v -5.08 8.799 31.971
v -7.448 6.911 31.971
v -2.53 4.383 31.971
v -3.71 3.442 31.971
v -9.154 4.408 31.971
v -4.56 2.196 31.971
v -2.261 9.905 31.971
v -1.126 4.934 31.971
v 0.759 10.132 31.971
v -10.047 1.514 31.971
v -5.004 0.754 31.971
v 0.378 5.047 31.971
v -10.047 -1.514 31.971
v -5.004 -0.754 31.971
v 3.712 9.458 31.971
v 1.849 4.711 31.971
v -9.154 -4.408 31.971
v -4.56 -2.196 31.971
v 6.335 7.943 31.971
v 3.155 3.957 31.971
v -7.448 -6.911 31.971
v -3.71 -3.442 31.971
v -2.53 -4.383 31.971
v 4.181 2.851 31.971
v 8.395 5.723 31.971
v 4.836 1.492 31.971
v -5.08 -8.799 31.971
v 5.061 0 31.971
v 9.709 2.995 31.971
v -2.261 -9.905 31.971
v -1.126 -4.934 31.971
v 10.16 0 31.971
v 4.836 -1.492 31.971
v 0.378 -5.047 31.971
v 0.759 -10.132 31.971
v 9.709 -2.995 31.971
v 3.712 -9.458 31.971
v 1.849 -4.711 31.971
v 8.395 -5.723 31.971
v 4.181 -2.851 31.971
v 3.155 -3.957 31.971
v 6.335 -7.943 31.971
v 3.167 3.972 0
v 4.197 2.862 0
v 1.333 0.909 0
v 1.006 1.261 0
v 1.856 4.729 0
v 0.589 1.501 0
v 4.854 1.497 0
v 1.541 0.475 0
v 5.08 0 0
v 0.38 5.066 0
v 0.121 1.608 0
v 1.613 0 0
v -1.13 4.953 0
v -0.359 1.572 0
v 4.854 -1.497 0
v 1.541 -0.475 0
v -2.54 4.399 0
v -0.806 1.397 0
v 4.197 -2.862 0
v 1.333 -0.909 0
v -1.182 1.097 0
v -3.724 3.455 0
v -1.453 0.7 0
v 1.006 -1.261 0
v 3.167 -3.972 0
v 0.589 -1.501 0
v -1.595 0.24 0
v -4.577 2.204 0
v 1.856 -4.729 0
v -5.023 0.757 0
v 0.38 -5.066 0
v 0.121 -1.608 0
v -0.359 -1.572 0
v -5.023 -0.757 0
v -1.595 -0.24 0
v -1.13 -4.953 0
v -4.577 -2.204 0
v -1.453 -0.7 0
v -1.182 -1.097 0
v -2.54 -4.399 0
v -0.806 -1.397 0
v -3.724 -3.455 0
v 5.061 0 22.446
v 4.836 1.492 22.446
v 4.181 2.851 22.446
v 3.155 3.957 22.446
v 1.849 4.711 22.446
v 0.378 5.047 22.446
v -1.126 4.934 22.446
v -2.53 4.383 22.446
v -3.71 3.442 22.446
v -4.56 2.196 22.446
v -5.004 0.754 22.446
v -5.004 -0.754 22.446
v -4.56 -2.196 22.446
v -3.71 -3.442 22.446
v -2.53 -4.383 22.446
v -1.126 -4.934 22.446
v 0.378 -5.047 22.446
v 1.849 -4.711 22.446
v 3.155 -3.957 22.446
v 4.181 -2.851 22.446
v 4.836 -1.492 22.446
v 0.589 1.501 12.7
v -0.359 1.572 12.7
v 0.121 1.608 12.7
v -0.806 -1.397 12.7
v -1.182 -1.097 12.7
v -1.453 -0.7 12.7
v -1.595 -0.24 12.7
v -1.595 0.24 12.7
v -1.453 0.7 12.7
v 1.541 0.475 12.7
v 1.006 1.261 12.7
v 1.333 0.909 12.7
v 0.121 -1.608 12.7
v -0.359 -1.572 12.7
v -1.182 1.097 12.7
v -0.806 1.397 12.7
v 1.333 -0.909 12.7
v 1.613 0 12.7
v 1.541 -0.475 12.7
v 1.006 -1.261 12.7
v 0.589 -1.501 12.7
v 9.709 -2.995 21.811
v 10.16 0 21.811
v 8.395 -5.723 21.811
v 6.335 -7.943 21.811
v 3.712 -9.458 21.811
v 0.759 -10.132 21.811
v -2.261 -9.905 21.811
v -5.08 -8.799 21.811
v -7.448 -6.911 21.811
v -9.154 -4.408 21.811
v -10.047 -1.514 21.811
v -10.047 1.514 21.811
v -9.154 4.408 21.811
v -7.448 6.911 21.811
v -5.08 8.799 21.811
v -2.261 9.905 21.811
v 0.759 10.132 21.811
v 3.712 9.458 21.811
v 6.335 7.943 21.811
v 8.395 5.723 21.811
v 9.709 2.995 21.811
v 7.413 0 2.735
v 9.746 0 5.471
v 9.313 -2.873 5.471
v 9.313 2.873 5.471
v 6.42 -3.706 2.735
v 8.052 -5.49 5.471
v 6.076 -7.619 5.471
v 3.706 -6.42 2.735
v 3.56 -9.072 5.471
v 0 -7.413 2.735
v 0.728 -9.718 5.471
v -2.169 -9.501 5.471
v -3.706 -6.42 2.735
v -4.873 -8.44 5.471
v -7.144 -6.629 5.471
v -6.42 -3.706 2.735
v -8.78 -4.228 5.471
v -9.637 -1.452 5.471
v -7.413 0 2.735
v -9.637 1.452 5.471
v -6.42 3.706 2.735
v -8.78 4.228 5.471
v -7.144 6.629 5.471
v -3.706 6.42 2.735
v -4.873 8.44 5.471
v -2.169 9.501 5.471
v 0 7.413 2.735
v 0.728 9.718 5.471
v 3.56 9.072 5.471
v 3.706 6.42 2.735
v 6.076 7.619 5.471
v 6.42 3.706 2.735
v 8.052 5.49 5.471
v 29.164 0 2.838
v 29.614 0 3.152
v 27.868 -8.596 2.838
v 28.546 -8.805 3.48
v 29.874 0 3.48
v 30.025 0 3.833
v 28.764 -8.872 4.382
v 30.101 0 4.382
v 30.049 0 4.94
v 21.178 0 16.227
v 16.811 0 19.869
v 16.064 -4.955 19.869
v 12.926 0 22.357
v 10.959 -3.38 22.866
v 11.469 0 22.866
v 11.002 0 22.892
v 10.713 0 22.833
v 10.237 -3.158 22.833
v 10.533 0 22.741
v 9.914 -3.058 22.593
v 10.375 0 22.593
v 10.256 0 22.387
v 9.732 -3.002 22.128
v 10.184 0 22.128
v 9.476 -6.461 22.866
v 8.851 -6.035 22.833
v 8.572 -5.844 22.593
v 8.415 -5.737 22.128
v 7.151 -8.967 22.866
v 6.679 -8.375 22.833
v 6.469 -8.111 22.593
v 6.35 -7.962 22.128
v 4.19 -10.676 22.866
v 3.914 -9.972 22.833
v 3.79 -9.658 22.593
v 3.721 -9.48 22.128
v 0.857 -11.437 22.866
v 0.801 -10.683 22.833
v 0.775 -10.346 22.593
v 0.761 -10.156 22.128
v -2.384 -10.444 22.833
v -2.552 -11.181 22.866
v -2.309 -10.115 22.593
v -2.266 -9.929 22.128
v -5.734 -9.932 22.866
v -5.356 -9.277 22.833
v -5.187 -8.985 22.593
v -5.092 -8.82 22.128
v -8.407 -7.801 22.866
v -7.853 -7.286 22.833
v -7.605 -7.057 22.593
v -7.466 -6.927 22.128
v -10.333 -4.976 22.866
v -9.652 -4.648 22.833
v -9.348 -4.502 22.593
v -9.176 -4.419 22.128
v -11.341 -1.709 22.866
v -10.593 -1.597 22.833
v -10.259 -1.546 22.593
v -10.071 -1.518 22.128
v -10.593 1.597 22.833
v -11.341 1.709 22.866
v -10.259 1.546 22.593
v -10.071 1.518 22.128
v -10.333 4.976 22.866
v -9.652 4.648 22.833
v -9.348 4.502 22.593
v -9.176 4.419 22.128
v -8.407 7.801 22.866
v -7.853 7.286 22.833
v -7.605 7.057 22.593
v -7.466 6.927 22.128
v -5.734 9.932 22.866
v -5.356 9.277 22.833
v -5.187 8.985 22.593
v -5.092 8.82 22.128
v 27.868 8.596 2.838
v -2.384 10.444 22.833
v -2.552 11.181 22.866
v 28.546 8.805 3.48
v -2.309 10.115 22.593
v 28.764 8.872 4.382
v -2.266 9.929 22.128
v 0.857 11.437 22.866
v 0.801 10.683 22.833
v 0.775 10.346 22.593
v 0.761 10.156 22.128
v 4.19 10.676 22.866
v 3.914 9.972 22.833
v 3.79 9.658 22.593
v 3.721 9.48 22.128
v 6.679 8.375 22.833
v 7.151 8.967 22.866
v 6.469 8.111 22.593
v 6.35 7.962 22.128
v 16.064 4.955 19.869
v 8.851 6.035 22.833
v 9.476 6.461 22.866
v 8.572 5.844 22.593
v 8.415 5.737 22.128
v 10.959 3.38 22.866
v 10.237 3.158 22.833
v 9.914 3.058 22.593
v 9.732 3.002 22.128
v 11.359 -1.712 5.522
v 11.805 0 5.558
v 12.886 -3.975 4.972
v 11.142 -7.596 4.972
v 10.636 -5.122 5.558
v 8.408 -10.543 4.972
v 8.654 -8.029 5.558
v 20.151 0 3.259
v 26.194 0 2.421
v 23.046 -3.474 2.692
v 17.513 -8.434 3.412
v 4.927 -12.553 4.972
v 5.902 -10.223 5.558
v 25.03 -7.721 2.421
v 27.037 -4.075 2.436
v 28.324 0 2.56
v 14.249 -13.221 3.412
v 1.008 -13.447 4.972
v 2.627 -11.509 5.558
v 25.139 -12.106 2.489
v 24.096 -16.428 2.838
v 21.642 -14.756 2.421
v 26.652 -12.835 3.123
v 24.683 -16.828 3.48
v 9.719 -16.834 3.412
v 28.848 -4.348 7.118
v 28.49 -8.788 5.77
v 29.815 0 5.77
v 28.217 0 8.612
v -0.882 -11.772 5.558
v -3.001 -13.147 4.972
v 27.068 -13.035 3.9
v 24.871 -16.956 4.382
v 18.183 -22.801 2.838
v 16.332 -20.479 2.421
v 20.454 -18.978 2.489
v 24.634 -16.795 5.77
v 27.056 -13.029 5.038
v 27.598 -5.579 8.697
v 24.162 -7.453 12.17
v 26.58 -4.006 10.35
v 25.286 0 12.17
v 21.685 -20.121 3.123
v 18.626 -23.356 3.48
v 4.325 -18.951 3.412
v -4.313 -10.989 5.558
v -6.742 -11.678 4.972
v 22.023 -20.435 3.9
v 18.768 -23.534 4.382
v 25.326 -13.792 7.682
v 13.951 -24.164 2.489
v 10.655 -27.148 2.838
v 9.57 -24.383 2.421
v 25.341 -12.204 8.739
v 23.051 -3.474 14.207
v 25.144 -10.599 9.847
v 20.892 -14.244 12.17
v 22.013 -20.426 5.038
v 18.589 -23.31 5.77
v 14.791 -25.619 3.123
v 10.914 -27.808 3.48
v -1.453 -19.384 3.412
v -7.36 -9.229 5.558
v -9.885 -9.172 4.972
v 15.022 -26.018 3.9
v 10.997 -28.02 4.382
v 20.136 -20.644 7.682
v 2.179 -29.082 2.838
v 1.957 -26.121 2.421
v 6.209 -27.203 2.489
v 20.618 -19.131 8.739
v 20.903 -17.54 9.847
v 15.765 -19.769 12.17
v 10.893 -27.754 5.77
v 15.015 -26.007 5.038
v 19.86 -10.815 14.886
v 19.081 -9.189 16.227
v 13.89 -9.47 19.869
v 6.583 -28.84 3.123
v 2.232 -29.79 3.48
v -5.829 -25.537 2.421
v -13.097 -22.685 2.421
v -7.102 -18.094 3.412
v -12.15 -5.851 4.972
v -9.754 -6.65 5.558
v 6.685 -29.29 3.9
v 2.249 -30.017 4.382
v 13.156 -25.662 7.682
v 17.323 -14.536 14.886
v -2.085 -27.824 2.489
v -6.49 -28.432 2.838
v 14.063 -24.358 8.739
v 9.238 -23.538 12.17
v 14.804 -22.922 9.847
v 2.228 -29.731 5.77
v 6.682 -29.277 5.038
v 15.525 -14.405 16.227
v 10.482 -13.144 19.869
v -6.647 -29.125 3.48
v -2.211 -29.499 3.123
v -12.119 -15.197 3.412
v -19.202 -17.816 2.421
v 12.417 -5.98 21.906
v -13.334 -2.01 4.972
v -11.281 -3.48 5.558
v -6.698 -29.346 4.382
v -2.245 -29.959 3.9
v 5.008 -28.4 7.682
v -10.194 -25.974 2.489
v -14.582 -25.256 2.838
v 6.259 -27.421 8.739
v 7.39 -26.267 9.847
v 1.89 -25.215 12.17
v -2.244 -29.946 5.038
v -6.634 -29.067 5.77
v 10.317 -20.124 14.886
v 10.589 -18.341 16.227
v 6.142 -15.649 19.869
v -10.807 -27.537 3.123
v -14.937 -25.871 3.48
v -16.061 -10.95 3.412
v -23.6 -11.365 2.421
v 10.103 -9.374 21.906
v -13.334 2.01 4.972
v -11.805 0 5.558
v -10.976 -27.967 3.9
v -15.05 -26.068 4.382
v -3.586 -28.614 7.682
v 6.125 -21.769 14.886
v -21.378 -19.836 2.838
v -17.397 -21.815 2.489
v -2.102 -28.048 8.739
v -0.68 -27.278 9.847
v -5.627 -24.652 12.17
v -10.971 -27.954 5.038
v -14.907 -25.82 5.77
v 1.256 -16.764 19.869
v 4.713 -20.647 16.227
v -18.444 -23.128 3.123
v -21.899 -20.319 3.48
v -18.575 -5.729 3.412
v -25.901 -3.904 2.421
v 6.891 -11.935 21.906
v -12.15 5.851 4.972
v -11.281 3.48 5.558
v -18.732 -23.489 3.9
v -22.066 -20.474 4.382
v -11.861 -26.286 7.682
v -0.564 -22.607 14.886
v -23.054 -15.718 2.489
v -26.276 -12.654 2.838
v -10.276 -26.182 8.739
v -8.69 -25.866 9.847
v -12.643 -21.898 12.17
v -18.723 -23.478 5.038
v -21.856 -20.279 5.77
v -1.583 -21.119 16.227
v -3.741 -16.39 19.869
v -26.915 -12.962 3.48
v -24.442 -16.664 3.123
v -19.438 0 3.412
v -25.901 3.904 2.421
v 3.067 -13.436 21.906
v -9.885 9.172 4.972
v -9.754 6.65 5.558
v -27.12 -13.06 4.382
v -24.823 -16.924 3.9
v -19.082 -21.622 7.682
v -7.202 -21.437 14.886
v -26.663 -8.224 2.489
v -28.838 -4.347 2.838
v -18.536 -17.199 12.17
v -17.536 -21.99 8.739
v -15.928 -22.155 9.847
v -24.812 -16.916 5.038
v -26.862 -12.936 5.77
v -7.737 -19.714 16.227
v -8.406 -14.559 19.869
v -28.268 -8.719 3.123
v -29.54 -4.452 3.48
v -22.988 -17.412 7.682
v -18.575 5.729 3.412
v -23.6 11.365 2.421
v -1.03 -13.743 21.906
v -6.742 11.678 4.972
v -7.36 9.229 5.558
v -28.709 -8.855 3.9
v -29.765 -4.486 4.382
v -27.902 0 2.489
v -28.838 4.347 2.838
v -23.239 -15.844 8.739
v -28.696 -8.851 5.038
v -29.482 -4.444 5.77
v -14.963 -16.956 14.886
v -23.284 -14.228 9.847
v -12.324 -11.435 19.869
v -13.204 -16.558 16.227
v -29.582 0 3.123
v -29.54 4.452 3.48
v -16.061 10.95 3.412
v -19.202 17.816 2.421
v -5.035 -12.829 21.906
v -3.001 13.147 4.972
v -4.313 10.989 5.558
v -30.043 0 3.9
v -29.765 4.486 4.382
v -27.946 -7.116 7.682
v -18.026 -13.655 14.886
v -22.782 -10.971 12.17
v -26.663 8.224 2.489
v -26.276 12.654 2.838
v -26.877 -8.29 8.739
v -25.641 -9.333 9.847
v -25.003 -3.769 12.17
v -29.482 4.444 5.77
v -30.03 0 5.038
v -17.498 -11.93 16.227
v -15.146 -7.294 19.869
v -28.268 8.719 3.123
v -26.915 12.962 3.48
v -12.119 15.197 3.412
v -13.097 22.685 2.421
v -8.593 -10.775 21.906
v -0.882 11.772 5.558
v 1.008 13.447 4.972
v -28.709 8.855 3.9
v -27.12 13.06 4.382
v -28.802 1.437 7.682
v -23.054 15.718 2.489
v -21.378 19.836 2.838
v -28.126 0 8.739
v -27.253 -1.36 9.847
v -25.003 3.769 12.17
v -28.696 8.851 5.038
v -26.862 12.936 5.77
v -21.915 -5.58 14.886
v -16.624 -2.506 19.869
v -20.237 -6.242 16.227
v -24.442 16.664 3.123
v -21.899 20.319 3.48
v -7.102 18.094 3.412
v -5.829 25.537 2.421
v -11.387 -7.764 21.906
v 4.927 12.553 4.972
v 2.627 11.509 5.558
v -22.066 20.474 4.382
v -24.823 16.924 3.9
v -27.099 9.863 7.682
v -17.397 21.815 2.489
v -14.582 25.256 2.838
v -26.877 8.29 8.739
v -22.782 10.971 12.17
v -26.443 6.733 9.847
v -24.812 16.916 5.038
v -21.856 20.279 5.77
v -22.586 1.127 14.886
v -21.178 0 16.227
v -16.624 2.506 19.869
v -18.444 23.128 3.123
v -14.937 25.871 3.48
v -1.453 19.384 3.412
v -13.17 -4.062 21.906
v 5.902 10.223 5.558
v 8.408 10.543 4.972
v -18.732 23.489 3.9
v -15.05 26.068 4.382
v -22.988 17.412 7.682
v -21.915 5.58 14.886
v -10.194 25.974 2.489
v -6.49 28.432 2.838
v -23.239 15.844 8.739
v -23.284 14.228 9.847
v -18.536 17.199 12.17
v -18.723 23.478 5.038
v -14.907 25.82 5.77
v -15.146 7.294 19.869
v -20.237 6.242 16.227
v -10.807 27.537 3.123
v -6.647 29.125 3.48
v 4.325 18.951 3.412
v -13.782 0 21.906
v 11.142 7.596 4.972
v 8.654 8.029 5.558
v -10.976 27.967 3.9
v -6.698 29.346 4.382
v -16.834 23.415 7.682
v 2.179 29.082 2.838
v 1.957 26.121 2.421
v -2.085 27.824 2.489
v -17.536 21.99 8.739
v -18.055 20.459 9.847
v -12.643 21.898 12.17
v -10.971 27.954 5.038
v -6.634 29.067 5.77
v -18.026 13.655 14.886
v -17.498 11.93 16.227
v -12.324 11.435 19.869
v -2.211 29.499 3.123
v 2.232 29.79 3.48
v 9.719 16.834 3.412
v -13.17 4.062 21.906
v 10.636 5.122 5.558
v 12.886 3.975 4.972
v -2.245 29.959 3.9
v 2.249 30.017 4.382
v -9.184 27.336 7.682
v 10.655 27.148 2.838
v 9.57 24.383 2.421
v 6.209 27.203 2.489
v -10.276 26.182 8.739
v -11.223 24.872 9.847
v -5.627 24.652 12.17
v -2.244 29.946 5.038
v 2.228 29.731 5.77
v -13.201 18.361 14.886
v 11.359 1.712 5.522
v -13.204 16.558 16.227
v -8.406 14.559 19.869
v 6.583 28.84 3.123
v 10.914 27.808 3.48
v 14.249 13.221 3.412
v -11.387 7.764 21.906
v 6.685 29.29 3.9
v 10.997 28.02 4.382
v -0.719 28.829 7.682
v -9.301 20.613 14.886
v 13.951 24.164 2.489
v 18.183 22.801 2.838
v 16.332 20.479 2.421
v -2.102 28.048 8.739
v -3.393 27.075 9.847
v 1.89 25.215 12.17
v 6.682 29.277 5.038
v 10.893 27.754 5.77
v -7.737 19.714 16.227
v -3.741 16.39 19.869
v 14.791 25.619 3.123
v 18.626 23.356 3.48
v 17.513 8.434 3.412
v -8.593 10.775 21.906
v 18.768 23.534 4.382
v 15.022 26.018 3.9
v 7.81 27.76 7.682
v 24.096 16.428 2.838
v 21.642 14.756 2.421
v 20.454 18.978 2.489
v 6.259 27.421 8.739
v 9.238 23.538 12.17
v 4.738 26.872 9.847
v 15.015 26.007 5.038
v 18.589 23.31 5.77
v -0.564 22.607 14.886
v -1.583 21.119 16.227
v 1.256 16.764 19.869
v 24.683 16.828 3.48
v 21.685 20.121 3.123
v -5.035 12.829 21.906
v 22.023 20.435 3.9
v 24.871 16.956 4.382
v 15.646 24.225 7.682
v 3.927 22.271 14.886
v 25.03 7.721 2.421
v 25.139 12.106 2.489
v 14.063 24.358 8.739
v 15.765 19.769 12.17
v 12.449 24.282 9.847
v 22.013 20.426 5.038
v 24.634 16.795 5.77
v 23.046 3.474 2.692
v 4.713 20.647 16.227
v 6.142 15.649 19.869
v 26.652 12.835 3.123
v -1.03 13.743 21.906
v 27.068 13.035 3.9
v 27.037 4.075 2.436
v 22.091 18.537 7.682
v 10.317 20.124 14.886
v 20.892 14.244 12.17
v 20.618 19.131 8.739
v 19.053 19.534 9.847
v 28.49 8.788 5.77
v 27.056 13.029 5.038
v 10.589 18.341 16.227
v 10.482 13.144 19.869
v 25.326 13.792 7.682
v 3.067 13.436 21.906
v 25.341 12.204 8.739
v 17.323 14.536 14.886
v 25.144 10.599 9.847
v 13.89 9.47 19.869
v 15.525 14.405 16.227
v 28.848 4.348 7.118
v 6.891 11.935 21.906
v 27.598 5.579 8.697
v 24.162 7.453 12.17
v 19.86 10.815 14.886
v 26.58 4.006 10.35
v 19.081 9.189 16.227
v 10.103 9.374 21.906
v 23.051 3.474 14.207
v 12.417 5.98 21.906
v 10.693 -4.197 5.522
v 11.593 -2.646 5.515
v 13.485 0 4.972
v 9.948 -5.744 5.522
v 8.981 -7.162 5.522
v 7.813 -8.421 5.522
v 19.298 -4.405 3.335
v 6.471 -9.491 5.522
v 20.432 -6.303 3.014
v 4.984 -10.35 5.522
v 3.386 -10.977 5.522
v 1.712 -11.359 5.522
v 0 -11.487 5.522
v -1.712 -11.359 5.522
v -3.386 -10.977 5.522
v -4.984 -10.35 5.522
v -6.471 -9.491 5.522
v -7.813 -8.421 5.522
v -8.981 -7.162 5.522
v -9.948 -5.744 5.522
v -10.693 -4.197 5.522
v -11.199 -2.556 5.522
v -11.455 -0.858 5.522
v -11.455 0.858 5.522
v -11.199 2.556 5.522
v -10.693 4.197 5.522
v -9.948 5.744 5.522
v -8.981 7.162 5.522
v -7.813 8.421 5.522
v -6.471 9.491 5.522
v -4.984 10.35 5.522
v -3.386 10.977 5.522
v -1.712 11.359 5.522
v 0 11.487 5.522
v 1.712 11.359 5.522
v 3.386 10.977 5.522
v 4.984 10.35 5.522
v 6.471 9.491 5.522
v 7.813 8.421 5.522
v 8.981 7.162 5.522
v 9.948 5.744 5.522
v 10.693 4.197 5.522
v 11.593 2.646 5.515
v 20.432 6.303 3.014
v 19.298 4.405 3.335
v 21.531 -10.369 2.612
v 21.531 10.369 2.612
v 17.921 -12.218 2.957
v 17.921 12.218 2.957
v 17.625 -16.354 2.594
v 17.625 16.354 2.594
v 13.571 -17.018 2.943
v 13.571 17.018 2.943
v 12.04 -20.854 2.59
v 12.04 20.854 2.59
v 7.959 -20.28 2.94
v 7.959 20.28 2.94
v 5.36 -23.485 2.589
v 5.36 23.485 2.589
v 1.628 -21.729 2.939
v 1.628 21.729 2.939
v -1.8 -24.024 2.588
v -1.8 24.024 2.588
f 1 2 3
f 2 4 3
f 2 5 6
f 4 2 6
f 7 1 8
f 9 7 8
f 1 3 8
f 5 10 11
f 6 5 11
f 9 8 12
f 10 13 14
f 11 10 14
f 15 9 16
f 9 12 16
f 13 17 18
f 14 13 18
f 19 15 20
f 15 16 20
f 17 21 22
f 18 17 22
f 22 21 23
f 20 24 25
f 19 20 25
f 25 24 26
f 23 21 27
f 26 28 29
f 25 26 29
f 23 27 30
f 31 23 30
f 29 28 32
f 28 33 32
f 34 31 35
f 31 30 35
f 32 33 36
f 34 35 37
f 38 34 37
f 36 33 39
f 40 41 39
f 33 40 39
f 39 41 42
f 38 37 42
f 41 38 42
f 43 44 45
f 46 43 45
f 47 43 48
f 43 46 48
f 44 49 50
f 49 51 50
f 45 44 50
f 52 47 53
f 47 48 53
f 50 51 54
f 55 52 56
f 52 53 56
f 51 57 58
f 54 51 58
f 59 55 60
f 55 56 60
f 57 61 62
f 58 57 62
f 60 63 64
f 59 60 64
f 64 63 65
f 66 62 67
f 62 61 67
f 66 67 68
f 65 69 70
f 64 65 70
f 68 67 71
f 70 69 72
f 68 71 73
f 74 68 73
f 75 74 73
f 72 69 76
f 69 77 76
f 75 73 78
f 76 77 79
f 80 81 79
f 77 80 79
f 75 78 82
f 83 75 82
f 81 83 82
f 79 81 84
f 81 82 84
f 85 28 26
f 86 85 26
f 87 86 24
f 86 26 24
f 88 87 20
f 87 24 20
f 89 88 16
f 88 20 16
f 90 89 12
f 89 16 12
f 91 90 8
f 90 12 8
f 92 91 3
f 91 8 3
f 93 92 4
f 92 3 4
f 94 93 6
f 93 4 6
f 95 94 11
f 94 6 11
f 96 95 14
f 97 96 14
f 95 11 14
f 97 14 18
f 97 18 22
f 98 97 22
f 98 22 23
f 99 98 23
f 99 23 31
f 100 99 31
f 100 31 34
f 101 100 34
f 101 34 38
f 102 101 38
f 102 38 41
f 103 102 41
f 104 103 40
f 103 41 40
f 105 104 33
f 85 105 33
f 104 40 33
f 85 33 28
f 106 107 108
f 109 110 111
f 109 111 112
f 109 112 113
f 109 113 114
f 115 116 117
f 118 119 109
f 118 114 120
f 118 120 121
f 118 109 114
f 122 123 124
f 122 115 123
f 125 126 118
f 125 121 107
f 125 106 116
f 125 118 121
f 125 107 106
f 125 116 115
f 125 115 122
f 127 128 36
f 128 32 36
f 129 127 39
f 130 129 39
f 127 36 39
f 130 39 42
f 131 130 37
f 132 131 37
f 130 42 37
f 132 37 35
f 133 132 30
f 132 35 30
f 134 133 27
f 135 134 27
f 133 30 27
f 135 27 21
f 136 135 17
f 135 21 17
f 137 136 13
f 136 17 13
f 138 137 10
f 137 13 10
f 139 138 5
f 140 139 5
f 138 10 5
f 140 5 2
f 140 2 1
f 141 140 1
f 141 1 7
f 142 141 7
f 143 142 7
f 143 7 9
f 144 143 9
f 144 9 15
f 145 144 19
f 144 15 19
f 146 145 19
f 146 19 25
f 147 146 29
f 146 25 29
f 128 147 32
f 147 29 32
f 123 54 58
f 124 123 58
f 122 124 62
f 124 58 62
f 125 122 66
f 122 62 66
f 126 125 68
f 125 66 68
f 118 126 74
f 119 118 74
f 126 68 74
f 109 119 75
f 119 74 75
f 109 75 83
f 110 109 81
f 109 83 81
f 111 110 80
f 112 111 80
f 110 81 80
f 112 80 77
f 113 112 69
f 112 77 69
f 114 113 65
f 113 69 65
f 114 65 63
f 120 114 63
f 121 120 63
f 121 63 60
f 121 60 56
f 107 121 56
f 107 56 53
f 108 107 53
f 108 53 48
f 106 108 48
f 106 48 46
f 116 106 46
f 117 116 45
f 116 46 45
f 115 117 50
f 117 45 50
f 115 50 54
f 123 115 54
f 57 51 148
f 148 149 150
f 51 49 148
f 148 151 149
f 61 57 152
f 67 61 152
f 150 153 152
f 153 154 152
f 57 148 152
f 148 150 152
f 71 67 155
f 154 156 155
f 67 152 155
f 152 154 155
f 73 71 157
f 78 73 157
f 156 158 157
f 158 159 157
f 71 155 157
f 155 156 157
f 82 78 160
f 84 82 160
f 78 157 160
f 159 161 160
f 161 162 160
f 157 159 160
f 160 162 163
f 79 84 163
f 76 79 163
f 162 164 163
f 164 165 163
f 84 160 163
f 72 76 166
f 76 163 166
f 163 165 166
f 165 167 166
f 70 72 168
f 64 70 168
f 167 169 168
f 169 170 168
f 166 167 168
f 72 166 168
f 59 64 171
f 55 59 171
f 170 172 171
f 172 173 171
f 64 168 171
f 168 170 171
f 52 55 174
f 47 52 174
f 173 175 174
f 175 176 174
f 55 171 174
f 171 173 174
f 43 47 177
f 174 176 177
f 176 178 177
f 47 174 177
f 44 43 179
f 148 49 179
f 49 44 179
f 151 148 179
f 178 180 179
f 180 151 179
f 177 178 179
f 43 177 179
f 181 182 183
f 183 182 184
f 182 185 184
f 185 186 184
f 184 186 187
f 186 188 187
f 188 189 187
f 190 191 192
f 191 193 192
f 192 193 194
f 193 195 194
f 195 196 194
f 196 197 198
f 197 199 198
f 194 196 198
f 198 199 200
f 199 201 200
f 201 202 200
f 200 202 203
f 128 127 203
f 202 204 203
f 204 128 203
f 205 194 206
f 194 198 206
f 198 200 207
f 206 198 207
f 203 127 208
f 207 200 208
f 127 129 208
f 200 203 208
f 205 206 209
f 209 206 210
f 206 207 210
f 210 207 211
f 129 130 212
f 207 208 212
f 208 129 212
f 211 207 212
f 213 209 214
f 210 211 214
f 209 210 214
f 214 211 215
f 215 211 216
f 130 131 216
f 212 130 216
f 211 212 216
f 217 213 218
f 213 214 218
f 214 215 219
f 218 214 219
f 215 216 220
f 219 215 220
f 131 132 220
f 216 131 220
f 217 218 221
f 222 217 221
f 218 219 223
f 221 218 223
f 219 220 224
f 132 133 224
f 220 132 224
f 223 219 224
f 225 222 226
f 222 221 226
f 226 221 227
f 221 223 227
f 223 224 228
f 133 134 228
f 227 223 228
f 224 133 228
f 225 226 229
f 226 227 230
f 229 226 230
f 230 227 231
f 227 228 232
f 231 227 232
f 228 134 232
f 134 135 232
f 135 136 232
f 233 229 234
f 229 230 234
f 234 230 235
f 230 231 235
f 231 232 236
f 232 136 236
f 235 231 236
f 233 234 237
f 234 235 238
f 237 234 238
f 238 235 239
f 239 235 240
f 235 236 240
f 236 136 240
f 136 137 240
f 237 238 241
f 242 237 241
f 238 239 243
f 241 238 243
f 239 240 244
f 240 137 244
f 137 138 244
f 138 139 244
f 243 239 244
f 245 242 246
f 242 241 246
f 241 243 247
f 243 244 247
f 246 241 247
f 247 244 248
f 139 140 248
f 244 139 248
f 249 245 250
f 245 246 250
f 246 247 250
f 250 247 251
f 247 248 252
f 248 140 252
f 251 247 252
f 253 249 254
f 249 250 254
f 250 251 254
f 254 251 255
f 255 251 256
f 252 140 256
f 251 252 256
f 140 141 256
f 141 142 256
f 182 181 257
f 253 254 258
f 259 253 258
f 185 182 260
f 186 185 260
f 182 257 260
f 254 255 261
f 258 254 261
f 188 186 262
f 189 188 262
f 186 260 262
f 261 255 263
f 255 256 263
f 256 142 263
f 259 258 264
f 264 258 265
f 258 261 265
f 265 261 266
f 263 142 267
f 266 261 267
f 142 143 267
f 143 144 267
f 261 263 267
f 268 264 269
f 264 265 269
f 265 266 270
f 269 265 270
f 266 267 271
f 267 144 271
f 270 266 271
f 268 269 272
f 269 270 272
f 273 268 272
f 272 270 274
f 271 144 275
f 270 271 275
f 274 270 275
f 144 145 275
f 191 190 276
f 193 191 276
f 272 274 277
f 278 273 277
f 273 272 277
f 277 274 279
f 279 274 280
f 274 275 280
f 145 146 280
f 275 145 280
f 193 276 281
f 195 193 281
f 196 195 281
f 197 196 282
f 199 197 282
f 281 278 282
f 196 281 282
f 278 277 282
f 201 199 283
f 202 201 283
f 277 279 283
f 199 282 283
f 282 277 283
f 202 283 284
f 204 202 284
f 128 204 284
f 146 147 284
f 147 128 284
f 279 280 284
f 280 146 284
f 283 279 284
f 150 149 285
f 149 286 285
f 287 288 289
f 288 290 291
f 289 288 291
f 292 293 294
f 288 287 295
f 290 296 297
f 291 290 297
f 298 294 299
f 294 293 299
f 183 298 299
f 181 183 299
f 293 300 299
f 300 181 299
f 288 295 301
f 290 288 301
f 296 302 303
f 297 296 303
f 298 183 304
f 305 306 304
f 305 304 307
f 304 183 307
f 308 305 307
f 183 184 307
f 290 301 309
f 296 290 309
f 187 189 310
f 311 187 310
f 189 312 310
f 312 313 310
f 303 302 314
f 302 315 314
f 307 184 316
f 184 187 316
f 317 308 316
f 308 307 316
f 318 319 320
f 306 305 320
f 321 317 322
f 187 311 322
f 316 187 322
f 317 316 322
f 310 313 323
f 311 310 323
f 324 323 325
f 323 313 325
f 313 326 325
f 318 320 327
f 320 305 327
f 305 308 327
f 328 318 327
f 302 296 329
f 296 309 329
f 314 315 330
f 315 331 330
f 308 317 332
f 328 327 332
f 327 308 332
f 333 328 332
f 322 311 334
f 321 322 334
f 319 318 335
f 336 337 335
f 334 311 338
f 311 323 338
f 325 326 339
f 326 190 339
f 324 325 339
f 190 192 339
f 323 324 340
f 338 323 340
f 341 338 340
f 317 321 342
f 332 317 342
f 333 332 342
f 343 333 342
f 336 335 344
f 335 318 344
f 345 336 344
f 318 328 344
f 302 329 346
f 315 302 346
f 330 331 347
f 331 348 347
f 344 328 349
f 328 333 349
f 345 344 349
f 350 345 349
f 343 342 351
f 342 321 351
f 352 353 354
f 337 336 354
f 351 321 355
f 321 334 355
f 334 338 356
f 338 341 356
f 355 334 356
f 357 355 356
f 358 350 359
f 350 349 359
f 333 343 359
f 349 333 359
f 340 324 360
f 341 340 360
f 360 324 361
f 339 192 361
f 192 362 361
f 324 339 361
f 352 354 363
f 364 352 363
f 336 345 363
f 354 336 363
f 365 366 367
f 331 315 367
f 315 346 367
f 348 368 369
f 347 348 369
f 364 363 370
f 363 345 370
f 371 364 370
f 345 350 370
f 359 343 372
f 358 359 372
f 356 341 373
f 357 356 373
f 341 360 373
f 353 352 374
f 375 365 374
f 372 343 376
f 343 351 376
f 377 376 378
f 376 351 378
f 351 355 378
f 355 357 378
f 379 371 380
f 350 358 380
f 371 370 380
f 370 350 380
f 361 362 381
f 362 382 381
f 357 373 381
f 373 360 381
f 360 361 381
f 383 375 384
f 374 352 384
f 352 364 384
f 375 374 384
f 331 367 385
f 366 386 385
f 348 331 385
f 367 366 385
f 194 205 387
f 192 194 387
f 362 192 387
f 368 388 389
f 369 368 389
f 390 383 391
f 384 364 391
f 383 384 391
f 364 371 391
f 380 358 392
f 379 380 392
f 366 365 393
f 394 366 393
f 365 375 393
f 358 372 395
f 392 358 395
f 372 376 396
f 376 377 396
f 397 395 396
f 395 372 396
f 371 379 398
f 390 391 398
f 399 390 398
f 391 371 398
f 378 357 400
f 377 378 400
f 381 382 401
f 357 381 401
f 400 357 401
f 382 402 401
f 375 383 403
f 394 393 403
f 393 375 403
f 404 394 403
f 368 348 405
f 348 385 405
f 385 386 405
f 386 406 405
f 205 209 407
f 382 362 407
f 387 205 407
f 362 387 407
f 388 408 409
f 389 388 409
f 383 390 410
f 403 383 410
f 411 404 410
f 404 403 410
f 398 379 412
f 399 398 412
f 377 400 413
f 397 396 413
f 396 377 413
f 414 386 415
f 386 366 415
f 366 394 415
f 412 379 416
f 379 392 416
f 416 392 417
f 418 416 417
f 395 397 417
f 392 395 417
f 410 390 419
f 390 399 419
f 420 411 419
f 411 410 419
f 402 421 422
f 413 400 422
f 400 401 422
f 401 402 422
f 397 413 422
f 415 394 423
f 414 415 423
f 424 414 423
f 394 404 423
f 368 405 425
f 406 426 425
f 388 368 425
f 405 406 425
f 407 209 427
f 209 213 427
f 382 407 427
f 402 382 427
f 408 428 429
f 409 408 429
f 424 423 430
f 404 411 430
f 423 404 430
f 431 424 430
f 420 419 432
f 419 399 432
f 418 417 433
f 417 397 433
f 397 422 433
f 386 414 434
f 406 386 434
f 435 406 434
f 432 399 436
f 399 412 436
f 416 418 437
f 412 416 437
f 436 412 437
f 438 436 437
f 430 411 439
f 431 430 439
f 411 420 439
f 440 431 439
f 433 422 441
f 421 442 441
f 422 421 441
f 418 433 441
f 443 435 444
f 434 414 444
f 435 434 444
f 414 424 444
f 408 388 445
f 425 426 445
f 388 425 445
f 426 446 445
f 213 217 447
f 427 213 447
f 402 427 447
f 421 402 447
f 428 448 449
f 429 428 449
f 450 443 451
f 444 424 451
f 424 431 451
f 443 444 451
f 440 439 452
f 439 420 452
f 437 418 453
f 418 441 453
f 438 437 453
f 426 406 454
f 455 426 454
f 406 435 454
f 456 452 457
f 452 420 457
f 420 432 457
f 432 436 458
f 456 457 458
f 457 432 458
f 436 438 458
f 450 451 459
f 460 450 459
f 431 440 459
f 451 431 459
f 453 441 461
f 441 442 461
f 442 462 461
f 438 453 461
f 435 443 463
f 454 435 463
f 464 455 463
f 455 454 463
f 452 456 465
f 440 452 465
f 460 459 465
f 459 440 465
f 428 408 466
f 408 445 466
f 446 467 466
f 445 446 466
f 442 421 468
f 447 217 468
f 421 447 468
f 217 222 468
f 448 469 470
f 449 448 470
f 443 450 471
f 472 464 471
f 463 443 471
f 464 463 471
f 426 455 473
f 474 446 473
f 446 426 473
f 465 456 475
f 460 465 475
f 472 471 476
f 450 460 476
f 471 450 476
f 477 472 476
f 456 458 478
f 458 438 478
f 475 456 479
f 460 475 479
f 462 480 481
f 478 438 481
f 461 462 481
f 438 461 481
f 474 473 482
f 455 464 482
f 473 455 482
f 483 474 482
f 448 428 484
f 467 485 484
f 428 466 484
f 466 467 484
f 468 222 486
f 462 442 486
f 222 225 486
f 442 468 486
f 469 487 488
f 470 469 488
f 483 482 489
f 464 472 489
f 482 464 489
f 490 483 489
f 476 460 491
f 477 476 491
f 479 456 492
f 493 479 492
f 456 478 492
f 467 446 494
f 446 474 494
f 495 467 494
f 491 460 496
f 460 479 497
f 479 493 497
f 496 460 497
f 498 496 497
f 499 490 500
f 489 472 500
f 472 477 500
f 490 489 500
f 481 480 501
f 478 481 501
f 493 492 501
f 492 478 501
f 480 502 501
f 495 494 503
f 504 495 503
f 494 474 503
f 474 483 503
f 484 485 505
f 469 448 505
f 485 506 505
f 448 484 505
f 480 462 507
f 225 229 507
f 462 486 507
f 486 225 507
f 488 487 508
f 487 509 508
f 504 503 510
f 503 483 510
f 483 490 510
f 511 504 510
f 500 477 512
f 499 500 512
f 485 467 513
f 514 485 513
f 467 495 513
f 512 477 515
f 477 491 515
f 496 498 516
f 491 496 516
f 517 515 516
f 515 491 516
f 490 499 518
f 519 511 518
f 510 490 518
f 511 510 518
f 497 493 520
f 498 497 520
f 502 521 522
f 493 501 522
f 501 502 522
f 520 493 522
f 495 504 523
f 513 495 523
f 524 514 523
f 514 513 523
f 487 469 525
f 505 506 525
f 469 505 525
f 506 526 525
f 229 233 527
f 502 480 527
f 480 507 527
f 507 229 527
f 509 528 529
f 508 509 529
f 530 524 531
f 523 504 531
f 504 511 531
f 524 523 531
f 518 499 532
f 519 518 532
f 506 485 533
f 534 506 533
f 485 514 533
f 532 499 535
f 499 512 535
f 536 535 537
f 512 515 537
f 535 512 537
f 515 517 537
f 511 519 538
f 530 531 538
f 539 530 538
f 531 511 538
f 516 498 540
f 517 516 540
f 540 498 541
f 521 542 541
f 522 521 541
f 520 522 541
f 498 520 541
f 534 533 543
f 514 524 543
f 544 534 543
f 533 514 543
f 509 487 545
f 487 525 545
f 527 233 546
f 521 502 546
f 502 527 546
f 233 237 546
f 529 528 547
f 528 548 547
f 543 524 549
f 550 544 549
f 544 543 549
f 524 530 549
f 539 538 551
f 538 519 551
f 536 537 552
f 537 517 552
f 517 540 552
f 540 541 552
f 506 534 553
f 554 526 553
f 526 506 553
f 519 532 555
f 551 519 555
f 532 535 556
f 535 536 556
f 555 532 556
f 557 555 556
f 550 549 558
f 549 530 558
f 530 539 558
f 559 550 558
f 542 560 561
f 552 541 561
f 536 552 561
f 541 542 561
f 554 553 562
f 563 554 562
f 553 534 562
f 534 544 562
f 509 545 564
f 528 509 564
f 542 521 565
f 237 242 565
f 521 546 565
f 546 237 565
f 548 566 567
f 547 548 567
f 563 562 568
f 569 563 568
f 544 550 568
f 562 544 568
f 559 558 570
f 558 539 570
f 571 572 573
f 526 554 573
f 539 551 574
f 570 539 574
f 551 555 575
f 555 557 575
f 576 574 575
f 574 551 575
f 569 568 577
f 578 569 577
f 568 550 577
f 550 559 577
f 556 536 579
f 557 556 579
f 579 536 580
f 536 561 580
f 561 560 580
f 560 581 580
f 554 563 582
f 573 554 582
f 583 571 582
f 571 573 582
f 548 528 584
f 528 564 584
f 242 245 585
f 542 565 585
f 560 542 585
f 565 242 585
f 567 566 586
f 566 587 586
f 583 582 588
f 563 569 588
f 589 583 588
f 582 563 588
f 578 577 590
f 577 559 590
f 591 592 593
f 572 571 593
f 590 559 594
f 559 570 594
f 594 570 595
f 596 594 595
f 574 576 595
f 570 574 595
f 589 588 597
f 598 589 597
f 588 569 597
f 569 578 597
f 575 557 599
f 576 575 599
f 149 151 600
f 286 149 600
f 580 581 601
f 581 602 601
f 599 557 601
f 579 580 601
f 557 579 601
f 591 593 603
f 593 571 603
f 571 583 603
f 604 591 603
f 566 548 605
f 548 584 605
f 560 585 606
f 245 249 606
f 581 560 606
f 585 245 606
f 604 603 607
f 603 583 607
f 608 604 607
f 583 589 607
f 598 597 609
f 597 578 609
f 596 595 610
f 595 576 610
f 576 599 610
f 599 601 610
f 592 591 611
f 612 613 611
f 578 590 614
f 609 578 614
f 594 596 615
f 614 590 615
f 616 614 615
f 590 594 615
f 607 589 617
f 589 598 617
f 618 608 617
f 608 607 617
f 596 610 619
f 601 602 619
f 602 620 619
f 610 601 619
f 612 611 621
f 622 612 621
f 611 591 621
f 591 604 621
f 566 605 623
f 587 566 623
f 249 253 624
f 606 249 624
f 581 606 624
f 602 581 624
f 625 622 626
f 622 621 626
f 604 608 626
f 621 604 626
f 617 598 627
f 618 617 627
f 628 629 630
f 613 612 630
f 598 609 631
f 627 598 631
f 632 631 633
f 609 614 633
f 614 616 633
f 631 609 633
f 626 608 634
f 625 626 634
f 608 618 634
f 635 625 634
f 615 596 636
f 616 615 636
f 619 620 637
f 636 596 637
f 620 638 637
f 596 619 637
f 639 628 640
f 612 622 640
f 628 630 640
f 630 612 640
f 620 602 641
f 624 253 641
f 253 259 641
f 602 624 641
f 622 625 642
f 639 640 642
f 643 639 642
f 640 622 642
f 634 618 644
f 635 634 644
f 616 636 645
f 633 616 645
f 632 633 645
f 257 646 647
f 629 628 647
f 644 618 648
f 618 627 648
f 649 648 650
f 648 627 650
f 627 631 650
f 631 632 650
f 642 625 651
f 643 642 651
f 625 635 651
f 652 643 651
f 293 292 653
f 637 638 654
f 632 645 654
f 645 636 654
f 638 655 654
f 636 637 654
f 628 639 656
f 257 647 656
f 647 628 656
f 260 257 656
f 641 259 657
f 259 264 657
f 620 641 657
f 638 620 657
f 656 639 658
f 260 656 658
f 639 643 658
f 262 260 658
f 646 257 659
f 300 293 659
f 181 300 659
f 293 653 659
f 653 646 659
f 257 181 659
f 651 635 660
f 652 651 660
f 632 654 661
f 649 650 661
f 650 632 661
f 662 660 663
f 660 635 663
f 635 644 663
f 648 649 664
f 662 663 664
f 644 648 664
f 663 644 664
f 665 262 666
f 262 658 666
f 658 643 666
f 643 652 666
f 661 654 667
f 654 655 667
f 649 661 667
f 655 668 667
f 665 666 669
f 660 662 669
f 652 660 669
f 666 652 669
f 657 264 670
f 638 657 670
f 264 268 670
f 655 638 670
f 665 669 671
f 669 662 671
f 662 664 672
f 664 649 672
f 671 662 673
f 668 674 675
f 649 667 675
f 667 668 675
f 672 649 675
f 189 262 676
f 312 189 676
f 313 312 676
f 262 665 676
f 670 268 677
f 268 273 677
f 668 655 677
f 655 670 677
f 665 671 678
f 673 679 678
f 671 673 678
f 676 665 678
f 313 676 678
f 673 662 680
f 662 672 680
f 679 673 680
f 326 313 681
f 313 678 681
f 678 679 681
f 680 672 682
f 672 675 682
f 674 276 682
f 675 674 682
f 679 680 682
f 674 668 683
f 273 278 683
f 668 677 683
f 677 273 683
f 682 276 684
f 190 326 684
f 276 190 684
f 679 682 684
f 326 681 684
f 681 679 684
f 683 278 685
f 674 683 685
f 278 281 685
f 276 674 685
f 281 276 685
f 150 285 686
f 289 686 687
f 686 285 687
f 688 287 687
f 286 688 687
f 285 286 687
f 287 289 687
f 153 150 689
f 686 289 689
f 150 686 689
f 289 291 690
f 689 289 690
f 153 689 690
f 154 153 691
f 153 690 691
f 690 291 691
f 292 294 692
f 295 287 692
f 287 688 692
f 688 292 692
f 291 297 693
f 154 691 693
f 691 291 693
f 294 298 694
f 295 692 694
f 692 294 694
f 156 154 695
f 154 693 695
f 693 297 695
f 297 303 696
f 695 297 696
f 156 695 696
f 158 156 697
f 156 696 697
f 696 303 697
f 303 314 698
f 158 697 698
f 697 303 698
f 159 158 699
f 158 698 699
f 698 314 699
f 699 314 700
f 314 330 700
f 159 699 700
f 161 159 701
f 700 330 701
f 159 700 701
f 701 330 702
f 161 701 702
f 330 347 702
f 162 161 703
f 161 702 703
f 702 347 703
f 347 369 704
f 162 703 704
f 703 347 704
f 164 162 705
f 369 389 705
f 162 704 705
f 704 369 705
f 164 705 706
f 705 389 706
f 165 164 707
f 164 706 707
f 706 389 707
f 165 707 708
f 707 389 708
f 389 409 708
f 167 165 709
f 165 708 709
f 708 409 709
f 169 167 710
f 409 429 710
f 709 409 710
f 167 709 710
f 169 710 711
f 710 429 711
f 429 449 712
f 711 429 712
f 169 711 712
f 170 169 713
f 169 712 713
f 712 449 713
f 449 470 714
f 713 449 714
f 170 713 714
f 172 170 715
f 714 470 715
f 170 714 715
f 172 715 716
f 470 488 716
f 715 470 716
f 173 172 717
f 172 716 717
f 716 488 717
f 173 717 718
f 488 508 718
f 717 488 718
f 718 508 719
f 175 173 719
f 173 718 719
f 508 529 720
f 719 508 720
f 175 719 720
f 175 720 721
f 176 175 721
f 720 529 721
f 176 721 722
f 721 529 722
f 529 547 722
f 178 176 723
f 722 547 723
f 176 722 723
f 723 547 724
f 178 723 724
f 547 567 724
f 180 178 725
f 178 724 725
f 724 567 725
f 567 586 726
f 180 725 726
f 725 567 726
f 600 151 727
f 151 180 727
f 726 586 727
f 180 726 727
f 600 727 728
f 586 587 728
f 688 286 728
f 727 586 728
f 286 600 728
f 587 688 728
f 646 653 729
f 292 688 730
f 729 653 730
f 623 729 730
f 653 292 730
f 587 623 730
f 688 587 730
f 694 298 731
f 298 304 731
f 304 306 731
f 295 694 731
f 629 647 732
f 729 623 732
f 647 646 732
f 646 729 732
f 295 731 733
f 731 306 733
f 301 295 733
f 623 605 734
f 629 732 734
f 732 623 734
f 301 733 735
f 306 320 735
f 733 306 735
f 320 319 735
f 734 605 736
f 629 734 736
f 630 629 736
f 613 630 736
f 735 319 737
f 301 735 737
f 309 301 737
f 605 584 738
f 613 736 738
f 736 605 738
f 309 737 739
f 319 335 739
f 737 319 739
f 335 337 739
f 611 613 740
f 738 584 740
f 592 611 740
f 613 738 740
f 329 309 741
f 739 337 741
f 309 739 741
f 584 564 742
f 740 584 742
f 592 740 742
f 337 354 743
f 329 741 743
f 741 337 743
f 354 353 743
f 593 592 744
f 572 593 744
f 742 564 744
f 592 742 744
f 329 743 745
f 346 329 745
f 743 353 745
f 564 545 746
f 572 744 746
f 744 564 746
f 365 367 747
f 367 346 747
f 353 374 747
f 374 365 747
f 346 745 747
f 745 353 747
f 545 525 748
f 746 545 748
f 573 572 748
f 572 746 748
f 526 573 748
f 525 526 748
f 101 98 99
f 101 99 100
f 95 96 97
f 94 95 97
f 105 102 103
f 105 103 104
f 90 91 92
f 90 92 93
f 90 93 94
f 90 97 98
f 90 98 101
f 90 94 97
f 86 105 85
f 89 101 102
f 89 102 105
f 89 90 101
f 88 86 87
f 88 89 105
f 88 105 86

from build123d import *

# Parameters (mm, degrees)
F2_R     = 5.0607119935
F3_DEPTH = 9.525
F4_R     = 1.6129
F5_DEPTH = 12.7


with BuildPart() as f1:
    # F0 (on Front) → F1 (revolve)
    with BuildSketch(Plane.XZ):
        with BuildLine():
            Line((0, 0), (5.08, 0))
            Line((5.08, 0), (9.7455104539, 5.4705391193))
            add(Edge.make_bspline(
                [(9.7455104539, 5.4705391193), (12.4344353671, 5.4705391193), (8.9021351307, 6.2337205754), (36.8213295394, -2.073424816), (23.6726198622, 15.5062359104), (10.16, 25.1128395454), (10.16, 21.811403902)],
                knots=[0, 0, 0, 0, 0.1140565874, 0.4307447791, 0.7154711829, 1, 1, 1, 1], degree=3))
            Line((10.16, 21.811403902), (10.16, 25.1128395454))
            Line((10.16, 25.1128395454), (10.16, 31.971403902))
            Line((10.16, 31.971403902), (0, 31.971403902))
            Line((0, 31.971403902), (0, 0))
        make_face()
    revolve(axis=Axis((0, 0, 15.985701951), (0, 0, -1)))

    # F2 (on face) → F3 (cut)
    with BuildSketch(Plane.XY.offset(31.971403902)):
        Circle(F2_R)
    extrude(amount=-F3_DEPTH, mode=Mode.SUBTRACT)

    # F4 (on face) → F5 (cut)
    with BuildSketch(Plane(origin=(0, 0, 0), x_dir=(1, 0, 0), z_dir=(0, 0, -1))):
        Circle(F4_R)
    extrude(amount=-F5_DEPTH, mode=Mode.SUBTRACT)


solid = f1.part
